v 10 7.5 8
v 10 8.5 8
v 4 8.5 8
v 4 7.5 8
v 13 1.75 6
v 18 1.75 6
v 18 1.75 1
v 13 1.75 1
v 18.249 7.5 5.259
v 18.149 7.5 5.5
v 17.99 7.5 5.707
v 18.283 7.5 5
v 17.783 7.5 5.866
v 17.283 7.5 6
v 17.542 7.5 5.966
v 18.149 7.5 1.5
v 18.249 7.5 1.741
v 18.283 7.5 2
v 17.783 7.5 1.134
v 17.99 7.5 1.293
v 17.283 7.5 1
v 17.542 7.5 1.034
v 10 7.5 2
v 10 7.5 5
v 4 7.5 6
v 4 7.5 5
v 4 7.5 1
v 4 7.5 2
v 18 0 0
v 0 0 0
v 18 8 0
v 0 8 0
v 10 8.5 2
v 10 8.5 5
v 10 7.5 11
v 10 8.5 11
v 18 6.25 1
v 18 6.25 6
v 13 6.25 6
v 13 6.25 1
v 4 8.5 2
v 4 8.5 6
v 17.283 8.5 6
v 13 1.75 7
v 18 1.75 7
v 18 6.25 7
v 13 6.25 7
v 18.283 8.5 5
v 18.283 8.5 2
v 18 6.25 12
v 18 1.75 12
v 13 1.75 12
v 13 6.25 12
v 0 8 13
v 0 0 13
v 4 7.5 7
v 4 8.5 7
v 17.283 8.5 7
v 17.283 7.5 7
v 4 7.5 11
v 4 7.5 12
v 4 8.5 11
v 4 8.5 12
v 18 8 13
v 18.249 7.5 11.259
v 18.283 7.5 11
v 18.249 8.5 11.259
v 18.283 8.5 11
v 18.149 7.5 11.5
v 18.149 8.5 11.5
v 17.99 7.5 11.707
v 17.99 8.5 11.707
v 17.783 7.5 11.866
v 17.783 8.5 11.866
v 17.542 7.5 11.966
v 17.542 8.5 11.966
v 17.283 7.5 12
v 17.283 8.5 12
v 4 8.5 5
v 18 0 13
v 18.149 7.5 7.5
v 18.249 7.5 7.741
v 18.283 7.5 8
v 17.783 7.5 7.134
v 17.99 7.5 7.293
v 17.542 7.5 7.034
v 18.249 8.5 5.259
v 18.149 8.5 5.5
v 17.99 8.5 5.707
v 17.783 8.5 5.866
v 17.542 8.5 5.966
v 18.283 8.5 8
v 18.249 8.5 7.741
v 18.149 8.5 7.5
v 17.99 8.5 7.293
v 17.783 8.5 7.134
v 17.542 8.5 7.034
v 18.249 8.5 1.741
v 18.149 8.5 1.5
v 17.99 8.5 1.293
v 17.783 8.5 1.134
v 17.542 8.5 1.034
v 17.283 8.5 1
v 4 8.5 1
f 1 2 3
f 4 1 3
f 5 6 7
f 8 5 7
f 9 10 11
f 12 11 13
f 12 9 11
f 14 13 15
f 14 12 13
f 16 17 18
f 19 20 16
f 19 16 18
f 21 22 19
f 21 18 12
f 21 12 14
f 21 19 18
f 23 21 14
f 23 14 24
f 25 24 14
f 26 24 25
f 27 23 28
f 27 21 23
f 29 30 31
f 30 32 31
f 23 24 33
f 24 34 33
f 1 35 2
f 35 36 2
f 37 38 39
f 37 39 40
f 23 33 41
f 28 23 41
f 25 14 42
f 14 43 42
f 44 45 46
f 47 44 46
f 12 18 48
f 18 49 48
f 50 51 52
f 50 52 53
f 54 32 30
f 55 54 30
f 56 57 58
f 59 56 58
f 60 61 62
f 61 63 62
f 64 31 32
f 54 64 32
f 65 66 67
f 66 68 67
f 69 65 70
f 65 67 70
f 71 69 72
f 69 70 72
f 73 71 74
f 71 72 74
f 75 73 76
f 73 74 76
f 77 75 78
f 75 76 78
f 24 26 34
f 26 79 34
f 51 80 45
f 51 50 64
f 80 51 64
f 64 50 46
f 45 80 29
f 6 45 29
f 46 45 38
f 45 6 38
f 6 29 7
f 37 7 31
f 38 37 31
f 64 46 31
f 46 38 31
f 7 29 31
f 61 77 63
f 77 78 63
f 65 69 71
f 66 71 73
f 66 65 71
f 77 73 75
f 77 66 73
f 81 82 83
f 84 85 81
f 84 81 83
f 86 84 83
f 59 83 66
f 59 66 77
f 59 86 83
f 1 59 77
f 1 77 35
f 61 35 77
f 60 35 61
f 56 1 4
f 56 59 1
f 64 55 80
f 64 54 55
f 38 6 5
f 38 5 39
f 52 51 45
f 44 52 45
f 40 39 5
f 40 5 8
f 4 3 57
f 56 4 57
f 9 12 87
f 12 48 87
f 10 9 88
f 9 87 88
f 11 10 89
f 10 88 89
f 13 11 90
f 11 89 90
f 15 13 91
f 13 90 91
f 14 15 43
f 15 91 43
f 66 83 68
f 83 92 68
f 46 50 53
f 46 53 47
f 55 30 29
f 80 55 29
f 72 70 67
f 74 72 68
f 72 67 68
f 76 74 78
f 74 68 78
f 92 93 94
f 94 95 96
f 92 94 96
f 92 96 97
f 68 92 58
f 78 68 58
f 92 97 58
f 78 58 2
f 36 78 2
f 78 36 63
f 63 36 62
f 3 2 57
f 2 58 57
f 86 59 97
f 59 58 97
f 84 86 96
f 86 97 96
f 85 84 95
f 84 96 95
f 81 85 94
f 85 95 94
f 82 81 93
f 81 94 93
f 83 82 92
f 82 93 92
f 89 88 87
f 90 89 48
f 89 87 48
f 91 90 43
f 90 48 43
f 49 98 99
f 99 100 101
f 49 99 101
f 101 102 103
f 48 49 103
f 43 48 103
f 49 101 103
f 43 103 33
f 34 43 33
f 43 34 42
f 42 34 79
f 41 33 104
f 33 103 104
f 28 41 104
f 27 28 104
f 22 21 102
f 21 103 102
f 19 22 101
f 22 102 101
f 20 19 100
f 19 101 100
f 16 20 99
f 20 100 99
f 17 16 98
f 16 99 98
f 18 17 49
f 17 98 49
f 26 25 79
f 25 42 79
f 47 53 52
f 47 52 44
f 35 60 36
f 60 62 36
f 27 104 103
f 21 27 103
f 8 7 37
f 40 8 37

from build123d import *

# Parameters (mm, degrees)
BOSS_EXTRU_1_DEPTH      = 13
ESQUISSE4_W             = 5
ESQUISSE4_H             = 4.5
ENL_V_MAT_EXTRU_2_DEPTH = 5
BOSS_EXTRU_2_DEPTH      = 0.5
BOSS_EXTRU_2_2_DEPTH    = 0.5


with BuildPart() as part:
    # Esquisse1 → Boss.-Extru.1 (new body)
    with BuildSketch(Plane.XY):
        Polygon((0, 0), (18, 0), (18, 8), (0, 8), (0, 4), align=None)
    extrude(amount=BOSS_EXTRU_1_DEPTH)

    # Esquisse4 → Enlèv. mat.-Extru.2 (cut)
    with BuildSketch(Plane(origin=(18, 0, 0), x_dir=(0, 0, -1), z_dir=(1, 0, 0))):
        with Locations((-3.5, 4)):
            Rectangle(ESQUISSE4_W, ESQUISSE4_H)
        with Locations((-9.5, 4)):
            Rectangle(ESQUISSE4_W, ESQUISSE4_H)
    extrude(amount=-ENL_V_MAT_EXTRU_2_DEPTH, mode=Mode.SUBTRACT)


with BuildPart() as body_2:
    # Esquisse5 → Boss.-Extru.2 (new body, symmetric)
    with BuildSketch(Plane(origin=(0, 8, 0), x_dir=(1, 0, 0), z_dir=(0, 1, 0))):
        with BuildLine():
            Line((4, -1), (17.283200591, -1))
            ThreePointArc((17.283200591, -1), (17.990307373, -1.292893219), (18.283200591, -2))
            Line((18.283200591, -2), (18.283200591, -5))
            ThreePointArc((18.283200591, -5), (17.990307373, -5.707106781), (17.283200591, -6))
            Line((17.283200591, -6), (4, -6))
            Line((4, -6), (4, -5))
            Line((4, -5), (10, -5))
            Line((10, -5), (10, -2))
            Line((10, -2), (4, -2))
            Line((4, -2), (4, -1))
        make_face()
    extrude(amount=BOSS_EXTRU_2_DEPTH, both=True)


with BuildPart() as body_3:
    # Esquisse5 → Boss.-Extru.2 2 (new body, symmetric)
    with BuildSketch(Plane(origin=(0, 8, 0), x_dir=(1, 0, 0), z_dir=(0, 1, 0))):
        with BuildLine():
            Line((4, -7), (17.283200591, -7))
            ThreePointArc((17.283200591, -7), (17.990307373, -7.292893219), (18.283200591, -8))
            Line((18.283200591, -8), (18.283200591, -11))
            ThreePointArc((18.283200591, -11), (17.990307373, -11.707106781), (17.283200591, -12))
            Line((17.283200591, -12), (4, -12))
            Line((4, -12), (4, -11))
            Line((4, -11), (10, -11))
            Line((10, -11), (10, -8))
            Line((10, -8), (4, -8))
            Line((4, -8), (4, -7))
        make_face()
    extrude(amount=BOSS_EXTRU_2_2_DEPTH, both=True)


solid = Compound([part.part, body_2.part, body_3.part])
